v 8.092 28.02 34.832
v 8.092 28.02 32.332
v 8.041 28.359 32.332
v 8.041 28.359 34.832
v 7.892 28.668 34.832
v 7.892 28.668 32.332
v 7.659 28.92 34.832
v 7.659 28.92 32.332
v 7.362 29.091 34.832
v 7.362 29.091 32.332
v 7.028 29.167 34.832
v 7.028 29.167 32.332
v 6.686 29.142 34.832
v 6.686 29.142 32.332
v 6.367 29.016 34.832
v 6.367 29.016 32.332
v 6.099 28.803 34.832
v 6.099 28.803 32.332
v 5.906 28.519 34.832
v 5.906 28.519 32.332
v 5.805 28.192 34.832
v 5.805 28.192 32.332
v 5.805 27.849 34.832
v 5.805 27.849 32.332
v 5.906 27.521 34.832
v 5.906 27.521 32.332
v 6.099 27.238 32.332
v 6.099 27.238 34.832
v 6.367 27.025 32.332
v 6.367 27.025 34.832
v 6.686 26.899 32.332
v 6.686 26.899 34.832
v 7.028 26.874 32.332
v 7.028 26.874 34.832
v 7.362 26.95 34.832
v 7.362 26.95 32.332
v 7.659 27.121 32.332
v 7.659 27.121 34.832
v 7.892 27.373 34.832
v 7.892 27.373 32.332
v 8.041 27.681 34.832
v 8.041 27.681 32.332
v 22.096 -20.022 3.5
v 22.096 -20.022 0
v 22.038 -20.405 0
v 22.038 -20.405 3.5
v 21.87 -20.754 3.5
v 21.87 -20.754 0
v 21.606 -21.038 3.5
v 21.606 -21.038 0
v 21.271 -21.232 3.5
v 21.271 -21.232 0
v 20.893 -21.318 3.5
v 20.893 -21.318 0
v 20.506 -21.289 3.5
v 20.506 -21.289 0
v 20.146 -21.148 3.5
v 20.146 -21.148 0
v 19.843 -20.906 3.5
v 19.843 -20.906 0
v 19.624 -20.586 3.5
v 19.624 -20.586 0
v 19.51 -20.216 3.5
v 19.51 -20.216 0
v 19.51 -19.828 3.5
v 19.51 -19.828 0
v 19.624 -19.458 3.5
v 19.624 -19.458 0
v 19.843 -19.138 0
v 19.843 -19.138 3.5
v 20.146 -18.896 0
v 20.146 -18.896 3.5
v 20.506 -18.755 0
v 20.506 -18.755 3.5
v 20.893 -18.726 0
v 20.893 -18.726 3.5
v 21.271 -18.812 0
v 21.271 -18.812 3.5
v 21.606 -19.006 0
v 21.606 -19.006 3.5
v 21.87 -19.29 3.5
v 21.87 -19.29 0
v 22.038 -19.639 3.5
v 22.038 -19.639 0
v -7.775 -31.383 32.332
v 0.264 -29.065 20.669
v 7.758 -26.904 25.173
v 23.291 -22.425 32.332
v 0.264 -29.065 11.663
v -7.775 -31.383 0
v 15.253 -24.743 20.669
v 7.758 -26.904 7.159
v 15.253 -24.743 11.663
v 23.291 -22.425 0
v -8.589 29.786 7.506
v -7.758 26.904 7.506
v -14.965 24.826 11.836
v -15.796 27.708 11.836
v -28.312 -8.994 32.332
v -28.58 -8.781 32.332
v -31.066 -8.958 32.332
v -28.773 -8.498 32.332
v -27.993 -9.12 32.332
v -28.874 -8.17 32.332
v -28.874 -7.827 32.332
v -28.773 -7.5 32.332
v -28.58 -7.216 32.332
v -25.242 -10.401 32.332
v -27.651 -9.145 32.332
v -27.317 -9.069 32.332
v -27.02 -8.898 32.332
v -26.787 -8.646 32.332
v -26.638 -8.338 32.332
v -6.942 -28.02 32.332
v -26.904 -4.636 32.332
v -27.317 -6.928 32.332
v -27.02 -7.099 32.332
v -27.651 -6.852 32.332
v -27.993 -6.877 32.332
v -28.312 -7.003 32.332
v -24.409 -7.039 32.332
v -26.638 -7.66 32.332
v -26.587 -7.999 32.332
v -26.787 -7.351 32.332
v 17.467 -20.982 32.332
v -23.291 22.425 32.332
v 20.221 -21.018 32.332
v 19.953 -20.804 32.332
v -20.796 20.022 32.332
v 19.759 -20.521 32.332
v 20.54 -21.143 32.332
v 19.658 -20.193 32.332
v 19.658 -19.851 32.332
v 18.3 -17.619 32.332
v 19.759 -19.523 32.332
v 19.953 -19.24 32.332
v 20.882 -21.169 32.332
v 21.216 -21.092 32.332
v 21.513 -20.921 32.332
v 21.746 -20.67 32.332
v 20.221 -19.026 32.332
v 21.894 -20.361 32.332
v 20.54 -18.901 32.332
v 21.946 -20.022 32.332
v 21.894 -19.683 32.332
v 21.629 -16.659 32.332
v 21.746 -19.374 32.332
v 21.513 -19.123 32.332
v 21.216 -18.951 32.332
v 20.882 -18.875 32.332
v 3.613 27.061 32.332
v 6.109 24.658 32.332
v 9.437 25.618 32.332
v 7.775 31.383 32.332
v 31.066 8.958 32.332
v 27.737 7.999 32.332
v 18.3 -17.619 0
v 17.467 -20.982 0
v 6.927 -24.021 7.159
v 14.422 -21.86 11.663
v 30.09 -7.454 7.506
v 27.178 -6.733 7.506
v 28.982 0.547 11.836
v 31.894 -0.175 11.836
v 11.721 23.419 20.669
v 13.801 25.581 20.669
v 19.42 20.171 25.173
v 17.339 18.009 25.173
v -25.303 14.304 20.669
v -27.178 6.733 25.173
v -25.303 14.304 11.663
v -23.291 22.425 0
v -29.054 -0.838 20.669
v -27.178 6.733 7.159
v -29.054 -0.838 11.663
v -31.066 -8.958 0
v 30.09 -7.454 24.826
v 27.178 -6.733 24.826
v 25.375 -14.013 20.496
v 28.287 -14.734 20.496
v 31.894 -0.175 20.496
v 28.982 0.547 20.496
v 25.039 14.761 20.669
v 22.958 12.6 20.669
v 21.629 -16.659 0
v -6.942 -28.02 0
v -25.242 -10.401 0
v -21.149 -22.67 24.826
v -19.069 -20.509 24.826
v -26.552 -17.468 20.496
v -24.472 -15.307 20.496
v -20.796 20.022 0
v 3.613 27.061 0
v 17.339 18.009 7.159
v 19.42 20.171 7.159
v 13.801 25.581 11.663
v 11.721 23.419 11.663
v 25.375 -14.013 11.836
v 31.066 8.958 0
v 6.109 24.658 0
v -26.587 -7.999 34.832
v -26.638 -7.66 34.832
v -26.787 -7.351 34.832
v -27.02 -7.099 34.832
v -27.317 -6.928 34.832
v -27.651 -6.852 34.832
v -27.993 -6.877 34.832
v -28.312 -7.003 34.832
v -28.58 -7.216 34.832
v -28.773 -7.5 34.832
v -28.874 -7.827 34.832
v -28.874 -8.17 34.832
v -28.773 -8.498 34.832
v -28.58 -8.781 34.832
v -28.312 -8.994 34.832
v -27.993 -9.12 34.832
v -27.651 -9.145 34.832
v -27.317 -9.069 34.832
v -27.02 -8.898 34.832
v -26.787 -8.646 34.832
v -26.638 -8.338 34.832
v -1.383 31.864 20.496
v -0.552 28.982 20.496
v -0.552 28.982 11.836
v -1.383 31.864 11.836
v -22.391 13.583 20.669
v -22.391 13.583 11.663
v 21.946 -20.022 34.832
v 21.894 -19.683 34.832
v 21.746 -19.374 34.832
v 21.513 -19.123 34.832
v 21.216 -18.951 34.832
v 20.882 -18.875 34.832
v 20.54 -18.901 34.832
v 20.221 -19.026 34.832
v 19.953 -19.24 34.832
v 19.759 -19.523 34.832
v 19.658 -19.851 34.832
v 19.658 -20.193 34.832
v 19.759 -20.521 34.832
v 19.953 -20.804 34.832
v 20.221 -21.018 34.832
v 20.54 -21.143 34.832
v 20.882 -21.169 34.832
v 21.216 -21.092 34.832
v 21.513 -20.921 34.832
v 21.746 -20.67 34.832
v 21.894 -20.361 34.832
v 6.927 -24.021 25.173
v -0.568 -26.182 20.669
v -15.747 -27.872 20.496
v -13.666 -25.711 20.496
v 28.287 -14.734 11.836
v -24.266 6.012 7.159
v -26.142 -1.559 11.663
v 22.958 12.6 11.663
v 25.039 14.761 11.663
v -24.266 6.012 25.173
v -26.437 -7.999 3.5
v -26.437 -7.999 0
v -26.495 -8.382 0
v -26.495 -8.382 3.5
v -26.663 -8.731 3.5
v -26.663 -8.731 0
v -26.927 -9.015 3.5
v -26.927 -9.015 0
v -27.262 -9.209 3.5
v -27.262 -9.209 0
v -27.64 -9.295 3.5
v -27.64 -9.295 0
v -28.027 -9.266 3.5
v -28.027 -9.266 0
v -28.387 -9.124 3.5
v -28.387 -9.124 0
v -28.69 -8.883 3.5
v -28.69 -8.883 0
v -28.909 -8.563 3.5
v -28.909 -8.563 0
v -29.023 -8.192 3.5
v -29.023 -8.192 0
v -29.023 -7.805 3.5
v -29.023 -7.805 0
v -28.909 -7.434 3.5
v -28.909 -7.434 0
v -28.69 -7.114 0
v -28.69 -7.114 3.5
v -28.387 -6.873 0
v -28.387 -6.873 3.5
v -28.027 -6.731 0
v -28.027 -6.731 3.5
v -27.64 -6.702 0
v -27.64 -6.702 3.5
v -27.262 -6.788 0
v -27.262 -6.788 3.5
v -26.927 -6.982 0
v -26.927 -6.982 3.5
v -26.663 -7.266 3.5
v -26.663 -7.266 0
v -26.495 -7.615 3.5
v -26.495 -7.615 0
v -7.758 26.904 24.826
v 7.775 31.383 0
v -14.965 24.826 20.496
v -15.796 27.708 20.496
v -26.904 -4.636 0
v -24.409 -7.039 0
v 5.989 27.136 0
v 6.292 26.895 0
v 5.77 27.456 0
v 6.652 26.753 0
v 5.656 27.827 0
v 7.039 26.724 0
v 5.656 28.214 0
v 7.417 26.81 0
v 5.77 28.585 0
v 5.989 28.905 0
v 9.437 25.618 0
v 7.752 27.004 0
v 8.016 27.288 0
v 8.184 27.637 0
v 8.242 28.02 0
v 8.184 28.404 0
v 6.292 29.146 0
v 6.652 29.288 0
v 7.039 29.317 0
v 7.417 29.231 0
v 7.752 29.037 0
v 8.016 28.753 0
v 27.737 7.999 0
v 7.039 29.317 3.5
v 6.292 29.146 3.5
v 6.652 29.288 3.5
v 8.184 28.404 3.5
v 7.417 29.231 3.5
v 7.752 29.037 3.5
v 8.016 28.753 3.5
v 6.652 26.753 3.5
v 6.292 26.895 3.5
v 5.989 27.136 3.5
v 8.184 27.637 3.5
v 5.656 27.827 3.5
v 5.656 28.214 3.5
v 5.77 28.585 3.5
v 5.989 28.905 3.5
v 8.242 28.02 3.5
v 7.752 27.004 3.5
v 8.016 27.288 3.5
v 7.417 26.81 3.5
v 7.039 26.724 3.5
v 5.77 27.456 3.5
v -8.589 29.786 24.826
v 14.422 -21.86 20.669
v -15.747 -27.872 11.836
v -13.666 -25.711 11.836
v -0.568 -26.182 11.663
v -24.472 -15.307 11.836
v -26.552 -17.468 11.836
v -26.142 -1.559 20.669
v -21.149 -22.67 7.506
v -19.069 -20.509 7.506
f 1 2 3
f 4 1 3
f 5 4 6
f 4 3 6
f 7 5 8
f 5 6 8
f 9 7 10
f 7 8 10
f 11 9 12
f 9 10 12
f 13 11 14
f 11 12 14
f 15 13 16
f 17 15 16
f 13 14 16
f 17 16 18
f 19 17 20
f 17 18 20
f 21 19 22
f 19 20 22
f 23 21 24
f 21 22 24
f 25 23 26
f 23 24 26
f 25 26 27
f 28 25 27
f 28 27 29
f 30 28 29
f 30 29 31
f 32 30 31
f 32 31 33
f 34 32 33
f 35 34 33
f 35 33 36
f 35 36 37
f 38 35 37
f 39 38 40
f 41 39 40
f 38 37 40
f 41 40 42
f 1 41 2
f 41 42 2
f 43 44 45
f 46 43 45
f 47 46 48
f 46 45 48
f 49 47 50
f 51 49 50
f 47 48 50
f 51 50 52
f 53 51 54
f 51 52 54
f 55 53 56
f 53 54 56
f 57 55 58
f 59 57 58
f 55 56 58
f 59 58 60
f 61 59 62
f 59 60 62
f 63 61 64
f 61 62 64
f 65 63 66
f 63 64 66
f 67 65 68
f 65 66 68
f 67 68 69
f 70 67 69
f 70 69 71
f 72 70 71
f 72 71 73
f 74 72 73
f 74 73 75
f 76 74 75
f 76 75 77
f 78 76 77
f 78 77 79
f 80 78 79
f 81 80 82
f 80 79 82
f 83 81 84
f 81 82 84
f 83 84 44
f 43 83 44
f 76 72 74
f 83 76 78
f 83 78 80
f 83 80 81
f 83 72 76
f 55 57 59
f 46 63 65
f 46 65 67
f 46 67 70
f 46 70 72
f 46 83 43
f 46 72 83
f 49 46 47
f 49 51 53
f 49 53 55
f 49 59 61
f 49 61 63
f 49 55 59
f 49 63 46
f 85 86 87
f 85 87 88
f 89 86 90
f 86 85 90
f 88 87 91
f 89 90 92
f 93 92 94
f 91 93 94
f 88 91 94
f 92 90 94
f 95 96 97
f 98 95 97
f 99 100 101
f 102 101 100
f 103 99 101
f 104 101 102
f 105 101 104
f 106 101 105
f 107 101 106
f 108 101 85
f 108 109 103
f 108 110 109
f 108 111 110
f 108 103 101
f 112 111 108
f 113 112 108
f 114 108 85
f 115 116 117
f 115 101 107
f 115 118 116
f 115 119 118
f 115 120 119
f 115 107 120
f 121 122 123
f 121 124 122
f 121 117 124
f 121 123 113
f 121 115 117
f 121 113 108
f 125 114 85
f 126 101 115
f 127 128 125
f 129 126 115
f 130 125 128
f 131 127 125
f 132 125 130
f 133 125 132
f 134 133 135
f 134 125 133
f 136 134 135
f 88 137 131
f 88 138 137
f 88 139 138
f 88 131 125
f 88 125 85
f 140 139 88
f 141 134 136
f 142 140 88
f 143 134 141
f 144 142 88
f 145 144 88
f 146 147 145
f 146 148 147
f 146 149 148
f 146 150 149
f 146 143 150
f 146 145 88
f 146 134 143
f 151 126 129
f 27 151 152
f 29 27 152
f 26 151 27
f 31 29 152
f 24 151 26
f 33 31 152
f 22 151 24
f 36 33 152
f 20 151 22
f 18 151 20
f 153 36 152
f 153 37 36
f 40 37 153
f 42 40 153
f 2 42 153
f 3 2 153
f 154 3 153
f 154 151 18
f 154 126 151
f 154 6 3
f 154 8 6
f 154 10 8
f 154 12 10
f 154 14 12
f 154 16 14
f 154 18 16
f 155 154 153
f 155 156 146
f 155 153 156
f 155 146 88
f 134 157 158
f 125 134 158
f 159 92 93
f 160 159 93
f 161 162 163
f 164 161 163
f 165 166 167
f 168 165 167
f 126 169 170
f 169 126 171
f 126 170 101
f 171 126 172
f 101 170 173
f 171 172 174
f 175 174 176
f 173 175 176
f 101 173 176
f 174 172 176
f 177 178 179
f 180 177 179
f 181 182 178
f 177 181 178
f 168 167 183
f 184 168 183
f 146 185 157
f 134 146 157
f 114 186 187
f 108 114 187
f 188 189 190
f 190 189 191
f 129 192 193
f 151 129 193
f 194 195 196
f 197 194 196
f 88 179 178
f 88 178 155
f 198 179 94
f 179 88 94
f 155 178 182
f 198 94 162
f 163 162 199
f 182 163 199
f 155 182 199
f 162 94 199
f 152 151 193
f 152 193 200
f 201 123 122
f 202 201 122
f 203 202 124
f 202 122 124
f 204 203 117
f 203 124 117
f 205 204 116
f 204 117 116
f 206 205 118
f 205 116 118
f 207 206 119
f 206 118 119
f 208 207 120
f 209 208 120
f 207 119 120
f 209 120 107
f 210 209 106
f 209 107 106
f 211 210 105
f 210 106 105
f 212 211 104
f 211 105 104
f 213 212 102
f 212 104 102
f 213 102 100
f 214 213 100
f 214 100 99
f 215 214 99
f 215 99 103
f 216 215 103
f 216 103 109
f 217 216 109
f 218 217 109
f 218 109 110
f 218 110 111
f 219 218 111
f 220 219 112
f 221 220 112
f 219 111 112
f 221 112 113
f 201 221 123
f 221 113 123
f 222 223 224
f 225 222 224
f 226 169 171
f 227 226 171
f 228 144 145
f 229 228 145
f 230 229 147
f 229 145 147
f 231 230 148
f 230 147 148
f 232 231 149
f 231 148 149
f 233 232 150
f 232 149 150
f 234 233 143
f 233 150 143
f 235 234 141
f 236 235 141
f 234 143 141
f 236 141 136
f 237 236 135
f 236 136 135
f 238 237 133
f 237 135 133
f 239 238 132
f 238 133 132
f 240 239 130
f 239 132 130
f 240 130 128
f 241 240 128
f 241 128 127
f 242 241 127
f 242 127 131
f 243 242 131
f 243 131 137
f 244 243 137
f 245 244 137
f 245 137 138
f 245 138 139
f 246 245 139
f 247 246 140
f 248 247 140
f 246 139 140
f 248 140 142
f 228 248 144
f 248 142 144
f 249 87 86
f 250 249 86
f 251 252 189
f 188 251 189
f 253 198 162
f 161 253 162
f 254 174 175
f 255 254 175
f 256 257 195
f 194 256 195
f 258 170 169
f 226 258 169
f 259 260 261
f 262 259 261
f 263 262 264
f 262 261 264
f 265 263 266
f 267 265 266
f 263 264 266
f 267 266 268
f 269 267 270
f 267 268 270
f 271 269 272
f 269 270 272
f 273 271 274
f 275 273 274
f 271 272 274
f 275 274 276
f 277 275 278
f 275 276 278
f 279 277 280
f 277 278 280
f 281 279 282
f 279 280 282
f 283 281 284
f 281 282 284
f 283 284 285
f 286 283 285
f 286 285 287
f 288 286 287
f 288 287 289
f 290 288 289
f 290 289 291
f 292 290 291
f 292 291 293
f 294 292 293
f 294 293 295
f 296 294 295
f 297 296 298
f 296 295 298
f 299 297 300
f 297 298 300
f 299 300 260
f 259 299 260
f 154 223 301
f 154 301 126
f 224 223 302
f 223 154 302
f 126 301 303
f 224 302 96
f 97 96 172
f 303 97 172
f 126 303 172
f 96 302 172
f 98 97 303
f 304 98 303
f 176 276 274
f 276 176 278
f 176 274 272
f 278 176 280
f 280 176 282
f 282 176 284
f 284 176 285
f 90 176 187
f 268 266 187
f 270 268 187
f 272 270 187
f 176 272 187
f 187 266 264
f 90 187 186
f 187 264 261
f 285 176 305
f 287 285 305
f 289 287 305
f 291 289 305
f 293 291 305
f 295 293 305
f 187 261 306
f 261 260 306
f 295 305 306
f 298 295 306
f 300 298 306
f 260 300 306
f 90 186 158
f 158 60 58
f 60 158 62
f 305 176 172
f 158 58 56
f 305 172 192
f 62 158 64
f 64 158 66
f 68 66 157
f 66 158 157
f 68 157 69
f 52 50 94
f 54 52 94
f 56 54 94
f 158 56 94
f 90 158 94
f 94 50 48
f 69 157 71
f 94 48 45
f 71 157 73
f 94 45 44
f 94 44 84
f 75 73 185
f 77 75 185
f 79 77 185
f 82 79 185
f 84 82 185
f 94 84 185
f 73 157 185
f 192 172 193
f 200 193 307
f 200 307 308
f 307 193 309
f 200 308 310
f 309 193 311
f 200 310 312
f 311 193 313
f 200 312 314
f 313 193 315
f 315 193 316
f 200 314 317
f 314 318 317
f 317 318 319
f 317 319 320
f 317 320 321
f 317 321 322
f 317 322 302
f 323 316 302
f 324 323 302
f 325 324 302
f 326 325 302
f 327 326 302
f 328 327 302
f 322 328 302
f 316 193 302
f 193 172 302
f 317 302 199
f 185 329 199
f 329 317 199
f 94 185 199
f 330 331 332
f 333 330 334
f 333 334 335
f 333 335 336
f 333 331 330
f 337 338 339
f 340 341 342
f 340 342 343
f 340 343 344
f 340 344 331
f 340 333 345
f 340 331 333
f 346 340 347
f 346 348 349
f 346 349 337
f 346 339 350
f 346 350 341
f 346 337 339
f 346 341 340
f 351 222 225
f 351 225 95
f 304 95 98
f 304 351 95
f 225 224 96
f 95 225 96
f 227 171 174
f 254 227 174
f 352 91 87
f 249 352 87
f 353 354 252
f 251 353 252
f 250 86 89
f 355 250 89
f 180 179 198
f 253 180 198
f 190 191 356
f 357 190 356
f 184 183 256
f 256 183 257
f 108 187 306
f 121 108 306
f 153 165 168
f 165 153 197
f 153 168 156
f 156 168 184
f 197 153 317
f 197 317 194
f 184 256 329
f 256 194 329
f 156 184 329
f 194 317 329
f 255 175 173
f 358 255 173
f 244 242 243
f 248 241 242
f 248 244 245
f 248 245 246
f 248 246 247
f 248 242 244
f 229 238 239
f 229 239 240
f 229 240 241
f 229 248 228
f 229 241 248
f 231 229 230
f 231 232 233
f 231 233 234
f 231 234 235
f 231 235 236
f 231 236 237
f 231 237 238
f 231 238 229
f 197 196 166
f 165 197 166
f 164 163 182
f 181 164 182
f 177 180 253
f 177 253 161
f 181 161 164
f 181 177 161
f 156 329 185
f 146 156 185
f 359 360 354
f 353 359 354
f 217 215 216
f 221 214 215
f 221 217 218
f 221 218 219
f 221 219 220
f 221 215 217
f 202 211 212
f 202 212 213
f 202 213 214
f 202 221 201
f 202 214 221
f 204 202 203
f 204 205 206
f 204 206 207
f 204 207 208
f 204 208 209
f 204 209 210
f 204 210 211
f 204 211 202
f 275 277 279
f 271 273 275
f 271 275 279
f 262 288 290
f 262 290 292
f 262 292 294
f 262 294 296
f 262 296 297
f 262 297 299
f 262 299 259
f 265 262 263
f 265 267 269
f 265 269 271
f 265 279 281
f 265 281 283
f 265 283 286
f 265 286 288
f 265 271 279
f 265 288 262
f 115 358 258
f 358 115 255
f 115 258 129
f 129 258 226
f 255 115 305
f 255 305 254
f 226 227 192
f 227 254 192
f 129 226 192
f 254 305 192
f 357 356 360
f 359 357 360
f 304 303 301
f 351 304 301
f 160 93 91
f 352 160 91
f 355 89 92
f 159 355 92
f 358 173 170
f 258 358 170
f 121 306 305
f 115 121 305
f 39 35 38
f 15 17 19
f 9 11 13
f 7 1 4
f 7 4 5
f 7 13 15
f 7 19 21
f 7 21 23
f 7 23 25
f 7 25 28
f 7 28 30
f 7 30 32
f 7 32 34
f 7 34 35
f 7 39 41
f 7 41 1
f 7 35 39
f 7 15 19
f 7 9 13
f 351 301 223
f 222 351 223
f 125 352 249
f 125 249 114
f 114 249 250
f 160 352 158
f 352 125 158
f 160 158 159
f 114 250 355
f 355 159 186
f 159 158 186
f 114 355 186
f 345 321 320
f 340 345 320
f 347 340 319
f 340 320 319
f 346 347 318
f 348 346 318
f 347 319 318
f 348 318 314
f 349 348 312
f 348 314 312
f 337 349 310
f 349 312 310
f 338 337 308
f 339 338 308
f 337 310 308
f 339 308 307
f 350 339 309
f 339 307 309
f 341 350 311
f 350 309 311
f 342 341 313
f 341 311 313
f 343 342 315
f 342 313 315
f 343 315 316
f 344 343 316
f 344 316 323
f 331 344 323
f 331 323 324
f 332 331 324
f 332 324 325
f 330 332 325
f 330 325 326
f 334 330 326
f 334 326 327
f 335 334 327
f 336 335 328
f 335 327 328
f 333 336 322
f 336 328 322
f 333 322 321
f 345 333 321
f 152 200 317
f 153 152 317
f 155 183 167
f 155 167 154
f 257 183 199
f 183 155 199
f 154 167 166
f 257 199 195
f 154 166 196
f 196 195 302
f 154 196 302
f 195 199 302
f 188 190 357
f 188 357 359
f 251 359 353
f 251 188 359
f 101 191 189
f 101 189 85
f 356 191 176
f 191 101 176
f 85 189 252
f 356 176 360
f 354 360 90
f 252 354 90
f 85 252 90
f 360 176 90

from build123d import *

# Parameters (mm, degrees)
F1_DEPTH  = 32.332
F2_R      = 1.3
F3_DEPTH  = 3.5
F4_R      = 1.15
F5_DEPTH  = 2.5
F12_DEPTH = 3
F13_DEPTH = 3
F14_DEPTH = 3
F15_DEPTH = 3
F16_DEPTH = 3
F17_DEPTH = 3


# Not quite as in the source:
# - a feature names something its author has since deleted; it is built from what else it names


with BuildPart() as f1:
    # F0 (on Top) → F1 (new body)
    with BuildSketch(Plane.XY):
        Polygon((-7.7747095404, -31.3829129447), (23.2910450847, -22.4245524414), (31.0657546251, 8.9583605033), (7.7747095404, 31.3829129447), (-23.2910450847, 22.4245524414), (-31.0657546251, -8.9583605033), align=None)
        Polygon((21.6285805621, -16.6594668643), (20.7955759684, -20.0219218227), (17.4671022586, -20.9817461623), (-6.9417049468, -28.0204579863), (-25.241811799, -10.4011667824), (-27.7372809153, -7.9985361637), (-26.9042763216, -4.6360812053), (-20.7955759684, 20.0219218227), (3.613231237, 27.0606336467), (6.9417049468, 28.0204579863), (9.437174063, 25.6178273676), (27.7372809153, 7.9985361637), align=None, mode=Mode.SUBTRACT)
        Polygon((-27.7372809153, -7.9985361637), (-25.241811799, -10.4011667824), (-24.4088072054, -7.038711824), (-26.9042763216, -4.6360812053), align=None)
        Polygon((6.1087003532, 24.658003028), (9.437174063, 25.6178273676), (6.9417049468, 28.0204579863), (3.613231237, 27.0606336467), align=None)
        Polygon((17.4671022586, -20.9817461623), (20.7955759684, -20.0219218227), (21.6285805621, -16.6594668643), (18.3001068522, -17.619291204), align=None)
    extrude(amount=F1_DEPTH)

    # F2 (on face) → F3 (cut)
    with BuildSketch(Plane(origin=(0, 0, 0), x_dir=(1, 0, 0), z_dir=(0, 0, -1))):
        with Locations((20.7955759684, 20.0219218227)):
            Circle(F2_R)
        with Locations((6.9417049468, -28.0204579863)):
            Circle(F2_R)
        with Locations((-27.7372809153, 7.9985361637)):
            Circle(F2_R)
    extrude(amount=-F3_DEPTH, mode=Mode.SUBTRACT)

    # F4 (on face) → F5 (join)
    with BuildSketch(Plane.XY.offset(32.332)):
        with Locations((6.9417049468, 28.0204579863)):
            Circle(F4_R)
        with Locations((20.7955759684, -20.0219218227)):
            Circle(F4_R)
        with Locations((-27.7372809153, -7.9985361637)):
            Circle(F4_R)
    extrude(amount=F5_DEPTH)

    # F9 (on face) → F12 (join)
    with BuildSketch(Plane(origin=(27.1783998549, -6.7330959691, 0), x_dir=(0.2404677132, 0.9706571377, 0), z_dir=(0.9706571377, -0.2404677132, 0))):
        Polygon((-7.5, 20.4961270189), (-7.5, 11.8358729811), (0, 7.5057459622), (7.5, 11.8358729811), (7.5, 20.4961270189), (0, 24.8262540378), align=None)
    extrude(amount=F12_DEPTH)

    # F7 (on face) → F13 (join)
    with BuildSketch(Plane(origin=(-7.7581677721, 26.9037326931, 0), x_dir=(-0.9608475962, -0.2770774204, 0), z_dir=(-0.2770774204, 0.9608475962, 0))):
        Polygon((-7.5, 20.4961270189), (-7.5, 11.8358729811), (0, 7.5057459622), (7.5, 11.8358729811), (7.5, 20.4961270189), (0, 24.8262540378), align=None)
    extrude(amount=F13_DEPTH)

    # F11 (on face) → F14 (join)
    with BuildSketch(Plane(origin=(-19.4202320828, -20.170636724, 0), x_dir=(0.720379883, -0.6935797172, 0), z_dir=(-0.6935797172, -0.720379883, 0))):
        Polygon((-7.0119504524, 20.4961270189), (-7.0119504524, 11.8358729811), (0.4880495476, 7.5057459622), (7.9880495476, 11.8358729811), (7.9880495476, 20.4961270189), (0.4880495476, 24.8262540378), align=None)
    extrude(amount=F14_DEPTH)

    # F10 (on face) → F15 (cut, through all)
    with BuildSketch(Plane(origin=(7.7581677721, -26.9037326931, 0), x_dir=(0.9608475962, 0.2770774204, 0), z_dir=(0.2770774204, -0.9608475962, 0))):
        Polygon((-7.8, 20.6693320997), (-7.8, 11.6626679003), (0, 7.1593358006), (7.8, 11.6626679003), (7.8, 20.6693320997), (0, 25.1726641994), align=None)
    extrude(amount=-F15_DEPTH, mode=Mode.SUBTRACT)

    # F6 (on face) → F16 (cut, through all)
    with BuildSketch(Plane(origin=(-27.1783998549, 6.7330959691, 0), x_dir=(-0.2404677132, -0.9706571377, 0), z_dir=(-0.9706571377, 0.2404677132, 0))):
        Polygon((-7.8, 20.6693320997), (-7.8, 11.6626679003), (0, 7.1593358006), (7.8, 11.6626679003), (7.8, 20.6693320997), (0, 25.1726641994), align=None)
    extrude(amount=-F16_DEPTH, mode=Mode.SUBTRACT)

    # F8 (on face) → F17 (cut, through all)
    with BuildSketch(Plane(origin=(19.4202320828, 20.170636724, 0), x_dir=(-0.720379883, 0.6935797172, 0), z_dir=(0.6935797172, 0.720379883, 0))):
        Polygon((-7.8, 20.6693320997), (-7.8, 11.6626679003), (0, 7.1593358006), (7.8, 11.6626679003), (7.8, 20.6693320997), (0, 25.1726641994), align=None)
    extrude(amount=-F17_DEPTH, mode=Mode.SUBTRACT)


solid = f1.part
